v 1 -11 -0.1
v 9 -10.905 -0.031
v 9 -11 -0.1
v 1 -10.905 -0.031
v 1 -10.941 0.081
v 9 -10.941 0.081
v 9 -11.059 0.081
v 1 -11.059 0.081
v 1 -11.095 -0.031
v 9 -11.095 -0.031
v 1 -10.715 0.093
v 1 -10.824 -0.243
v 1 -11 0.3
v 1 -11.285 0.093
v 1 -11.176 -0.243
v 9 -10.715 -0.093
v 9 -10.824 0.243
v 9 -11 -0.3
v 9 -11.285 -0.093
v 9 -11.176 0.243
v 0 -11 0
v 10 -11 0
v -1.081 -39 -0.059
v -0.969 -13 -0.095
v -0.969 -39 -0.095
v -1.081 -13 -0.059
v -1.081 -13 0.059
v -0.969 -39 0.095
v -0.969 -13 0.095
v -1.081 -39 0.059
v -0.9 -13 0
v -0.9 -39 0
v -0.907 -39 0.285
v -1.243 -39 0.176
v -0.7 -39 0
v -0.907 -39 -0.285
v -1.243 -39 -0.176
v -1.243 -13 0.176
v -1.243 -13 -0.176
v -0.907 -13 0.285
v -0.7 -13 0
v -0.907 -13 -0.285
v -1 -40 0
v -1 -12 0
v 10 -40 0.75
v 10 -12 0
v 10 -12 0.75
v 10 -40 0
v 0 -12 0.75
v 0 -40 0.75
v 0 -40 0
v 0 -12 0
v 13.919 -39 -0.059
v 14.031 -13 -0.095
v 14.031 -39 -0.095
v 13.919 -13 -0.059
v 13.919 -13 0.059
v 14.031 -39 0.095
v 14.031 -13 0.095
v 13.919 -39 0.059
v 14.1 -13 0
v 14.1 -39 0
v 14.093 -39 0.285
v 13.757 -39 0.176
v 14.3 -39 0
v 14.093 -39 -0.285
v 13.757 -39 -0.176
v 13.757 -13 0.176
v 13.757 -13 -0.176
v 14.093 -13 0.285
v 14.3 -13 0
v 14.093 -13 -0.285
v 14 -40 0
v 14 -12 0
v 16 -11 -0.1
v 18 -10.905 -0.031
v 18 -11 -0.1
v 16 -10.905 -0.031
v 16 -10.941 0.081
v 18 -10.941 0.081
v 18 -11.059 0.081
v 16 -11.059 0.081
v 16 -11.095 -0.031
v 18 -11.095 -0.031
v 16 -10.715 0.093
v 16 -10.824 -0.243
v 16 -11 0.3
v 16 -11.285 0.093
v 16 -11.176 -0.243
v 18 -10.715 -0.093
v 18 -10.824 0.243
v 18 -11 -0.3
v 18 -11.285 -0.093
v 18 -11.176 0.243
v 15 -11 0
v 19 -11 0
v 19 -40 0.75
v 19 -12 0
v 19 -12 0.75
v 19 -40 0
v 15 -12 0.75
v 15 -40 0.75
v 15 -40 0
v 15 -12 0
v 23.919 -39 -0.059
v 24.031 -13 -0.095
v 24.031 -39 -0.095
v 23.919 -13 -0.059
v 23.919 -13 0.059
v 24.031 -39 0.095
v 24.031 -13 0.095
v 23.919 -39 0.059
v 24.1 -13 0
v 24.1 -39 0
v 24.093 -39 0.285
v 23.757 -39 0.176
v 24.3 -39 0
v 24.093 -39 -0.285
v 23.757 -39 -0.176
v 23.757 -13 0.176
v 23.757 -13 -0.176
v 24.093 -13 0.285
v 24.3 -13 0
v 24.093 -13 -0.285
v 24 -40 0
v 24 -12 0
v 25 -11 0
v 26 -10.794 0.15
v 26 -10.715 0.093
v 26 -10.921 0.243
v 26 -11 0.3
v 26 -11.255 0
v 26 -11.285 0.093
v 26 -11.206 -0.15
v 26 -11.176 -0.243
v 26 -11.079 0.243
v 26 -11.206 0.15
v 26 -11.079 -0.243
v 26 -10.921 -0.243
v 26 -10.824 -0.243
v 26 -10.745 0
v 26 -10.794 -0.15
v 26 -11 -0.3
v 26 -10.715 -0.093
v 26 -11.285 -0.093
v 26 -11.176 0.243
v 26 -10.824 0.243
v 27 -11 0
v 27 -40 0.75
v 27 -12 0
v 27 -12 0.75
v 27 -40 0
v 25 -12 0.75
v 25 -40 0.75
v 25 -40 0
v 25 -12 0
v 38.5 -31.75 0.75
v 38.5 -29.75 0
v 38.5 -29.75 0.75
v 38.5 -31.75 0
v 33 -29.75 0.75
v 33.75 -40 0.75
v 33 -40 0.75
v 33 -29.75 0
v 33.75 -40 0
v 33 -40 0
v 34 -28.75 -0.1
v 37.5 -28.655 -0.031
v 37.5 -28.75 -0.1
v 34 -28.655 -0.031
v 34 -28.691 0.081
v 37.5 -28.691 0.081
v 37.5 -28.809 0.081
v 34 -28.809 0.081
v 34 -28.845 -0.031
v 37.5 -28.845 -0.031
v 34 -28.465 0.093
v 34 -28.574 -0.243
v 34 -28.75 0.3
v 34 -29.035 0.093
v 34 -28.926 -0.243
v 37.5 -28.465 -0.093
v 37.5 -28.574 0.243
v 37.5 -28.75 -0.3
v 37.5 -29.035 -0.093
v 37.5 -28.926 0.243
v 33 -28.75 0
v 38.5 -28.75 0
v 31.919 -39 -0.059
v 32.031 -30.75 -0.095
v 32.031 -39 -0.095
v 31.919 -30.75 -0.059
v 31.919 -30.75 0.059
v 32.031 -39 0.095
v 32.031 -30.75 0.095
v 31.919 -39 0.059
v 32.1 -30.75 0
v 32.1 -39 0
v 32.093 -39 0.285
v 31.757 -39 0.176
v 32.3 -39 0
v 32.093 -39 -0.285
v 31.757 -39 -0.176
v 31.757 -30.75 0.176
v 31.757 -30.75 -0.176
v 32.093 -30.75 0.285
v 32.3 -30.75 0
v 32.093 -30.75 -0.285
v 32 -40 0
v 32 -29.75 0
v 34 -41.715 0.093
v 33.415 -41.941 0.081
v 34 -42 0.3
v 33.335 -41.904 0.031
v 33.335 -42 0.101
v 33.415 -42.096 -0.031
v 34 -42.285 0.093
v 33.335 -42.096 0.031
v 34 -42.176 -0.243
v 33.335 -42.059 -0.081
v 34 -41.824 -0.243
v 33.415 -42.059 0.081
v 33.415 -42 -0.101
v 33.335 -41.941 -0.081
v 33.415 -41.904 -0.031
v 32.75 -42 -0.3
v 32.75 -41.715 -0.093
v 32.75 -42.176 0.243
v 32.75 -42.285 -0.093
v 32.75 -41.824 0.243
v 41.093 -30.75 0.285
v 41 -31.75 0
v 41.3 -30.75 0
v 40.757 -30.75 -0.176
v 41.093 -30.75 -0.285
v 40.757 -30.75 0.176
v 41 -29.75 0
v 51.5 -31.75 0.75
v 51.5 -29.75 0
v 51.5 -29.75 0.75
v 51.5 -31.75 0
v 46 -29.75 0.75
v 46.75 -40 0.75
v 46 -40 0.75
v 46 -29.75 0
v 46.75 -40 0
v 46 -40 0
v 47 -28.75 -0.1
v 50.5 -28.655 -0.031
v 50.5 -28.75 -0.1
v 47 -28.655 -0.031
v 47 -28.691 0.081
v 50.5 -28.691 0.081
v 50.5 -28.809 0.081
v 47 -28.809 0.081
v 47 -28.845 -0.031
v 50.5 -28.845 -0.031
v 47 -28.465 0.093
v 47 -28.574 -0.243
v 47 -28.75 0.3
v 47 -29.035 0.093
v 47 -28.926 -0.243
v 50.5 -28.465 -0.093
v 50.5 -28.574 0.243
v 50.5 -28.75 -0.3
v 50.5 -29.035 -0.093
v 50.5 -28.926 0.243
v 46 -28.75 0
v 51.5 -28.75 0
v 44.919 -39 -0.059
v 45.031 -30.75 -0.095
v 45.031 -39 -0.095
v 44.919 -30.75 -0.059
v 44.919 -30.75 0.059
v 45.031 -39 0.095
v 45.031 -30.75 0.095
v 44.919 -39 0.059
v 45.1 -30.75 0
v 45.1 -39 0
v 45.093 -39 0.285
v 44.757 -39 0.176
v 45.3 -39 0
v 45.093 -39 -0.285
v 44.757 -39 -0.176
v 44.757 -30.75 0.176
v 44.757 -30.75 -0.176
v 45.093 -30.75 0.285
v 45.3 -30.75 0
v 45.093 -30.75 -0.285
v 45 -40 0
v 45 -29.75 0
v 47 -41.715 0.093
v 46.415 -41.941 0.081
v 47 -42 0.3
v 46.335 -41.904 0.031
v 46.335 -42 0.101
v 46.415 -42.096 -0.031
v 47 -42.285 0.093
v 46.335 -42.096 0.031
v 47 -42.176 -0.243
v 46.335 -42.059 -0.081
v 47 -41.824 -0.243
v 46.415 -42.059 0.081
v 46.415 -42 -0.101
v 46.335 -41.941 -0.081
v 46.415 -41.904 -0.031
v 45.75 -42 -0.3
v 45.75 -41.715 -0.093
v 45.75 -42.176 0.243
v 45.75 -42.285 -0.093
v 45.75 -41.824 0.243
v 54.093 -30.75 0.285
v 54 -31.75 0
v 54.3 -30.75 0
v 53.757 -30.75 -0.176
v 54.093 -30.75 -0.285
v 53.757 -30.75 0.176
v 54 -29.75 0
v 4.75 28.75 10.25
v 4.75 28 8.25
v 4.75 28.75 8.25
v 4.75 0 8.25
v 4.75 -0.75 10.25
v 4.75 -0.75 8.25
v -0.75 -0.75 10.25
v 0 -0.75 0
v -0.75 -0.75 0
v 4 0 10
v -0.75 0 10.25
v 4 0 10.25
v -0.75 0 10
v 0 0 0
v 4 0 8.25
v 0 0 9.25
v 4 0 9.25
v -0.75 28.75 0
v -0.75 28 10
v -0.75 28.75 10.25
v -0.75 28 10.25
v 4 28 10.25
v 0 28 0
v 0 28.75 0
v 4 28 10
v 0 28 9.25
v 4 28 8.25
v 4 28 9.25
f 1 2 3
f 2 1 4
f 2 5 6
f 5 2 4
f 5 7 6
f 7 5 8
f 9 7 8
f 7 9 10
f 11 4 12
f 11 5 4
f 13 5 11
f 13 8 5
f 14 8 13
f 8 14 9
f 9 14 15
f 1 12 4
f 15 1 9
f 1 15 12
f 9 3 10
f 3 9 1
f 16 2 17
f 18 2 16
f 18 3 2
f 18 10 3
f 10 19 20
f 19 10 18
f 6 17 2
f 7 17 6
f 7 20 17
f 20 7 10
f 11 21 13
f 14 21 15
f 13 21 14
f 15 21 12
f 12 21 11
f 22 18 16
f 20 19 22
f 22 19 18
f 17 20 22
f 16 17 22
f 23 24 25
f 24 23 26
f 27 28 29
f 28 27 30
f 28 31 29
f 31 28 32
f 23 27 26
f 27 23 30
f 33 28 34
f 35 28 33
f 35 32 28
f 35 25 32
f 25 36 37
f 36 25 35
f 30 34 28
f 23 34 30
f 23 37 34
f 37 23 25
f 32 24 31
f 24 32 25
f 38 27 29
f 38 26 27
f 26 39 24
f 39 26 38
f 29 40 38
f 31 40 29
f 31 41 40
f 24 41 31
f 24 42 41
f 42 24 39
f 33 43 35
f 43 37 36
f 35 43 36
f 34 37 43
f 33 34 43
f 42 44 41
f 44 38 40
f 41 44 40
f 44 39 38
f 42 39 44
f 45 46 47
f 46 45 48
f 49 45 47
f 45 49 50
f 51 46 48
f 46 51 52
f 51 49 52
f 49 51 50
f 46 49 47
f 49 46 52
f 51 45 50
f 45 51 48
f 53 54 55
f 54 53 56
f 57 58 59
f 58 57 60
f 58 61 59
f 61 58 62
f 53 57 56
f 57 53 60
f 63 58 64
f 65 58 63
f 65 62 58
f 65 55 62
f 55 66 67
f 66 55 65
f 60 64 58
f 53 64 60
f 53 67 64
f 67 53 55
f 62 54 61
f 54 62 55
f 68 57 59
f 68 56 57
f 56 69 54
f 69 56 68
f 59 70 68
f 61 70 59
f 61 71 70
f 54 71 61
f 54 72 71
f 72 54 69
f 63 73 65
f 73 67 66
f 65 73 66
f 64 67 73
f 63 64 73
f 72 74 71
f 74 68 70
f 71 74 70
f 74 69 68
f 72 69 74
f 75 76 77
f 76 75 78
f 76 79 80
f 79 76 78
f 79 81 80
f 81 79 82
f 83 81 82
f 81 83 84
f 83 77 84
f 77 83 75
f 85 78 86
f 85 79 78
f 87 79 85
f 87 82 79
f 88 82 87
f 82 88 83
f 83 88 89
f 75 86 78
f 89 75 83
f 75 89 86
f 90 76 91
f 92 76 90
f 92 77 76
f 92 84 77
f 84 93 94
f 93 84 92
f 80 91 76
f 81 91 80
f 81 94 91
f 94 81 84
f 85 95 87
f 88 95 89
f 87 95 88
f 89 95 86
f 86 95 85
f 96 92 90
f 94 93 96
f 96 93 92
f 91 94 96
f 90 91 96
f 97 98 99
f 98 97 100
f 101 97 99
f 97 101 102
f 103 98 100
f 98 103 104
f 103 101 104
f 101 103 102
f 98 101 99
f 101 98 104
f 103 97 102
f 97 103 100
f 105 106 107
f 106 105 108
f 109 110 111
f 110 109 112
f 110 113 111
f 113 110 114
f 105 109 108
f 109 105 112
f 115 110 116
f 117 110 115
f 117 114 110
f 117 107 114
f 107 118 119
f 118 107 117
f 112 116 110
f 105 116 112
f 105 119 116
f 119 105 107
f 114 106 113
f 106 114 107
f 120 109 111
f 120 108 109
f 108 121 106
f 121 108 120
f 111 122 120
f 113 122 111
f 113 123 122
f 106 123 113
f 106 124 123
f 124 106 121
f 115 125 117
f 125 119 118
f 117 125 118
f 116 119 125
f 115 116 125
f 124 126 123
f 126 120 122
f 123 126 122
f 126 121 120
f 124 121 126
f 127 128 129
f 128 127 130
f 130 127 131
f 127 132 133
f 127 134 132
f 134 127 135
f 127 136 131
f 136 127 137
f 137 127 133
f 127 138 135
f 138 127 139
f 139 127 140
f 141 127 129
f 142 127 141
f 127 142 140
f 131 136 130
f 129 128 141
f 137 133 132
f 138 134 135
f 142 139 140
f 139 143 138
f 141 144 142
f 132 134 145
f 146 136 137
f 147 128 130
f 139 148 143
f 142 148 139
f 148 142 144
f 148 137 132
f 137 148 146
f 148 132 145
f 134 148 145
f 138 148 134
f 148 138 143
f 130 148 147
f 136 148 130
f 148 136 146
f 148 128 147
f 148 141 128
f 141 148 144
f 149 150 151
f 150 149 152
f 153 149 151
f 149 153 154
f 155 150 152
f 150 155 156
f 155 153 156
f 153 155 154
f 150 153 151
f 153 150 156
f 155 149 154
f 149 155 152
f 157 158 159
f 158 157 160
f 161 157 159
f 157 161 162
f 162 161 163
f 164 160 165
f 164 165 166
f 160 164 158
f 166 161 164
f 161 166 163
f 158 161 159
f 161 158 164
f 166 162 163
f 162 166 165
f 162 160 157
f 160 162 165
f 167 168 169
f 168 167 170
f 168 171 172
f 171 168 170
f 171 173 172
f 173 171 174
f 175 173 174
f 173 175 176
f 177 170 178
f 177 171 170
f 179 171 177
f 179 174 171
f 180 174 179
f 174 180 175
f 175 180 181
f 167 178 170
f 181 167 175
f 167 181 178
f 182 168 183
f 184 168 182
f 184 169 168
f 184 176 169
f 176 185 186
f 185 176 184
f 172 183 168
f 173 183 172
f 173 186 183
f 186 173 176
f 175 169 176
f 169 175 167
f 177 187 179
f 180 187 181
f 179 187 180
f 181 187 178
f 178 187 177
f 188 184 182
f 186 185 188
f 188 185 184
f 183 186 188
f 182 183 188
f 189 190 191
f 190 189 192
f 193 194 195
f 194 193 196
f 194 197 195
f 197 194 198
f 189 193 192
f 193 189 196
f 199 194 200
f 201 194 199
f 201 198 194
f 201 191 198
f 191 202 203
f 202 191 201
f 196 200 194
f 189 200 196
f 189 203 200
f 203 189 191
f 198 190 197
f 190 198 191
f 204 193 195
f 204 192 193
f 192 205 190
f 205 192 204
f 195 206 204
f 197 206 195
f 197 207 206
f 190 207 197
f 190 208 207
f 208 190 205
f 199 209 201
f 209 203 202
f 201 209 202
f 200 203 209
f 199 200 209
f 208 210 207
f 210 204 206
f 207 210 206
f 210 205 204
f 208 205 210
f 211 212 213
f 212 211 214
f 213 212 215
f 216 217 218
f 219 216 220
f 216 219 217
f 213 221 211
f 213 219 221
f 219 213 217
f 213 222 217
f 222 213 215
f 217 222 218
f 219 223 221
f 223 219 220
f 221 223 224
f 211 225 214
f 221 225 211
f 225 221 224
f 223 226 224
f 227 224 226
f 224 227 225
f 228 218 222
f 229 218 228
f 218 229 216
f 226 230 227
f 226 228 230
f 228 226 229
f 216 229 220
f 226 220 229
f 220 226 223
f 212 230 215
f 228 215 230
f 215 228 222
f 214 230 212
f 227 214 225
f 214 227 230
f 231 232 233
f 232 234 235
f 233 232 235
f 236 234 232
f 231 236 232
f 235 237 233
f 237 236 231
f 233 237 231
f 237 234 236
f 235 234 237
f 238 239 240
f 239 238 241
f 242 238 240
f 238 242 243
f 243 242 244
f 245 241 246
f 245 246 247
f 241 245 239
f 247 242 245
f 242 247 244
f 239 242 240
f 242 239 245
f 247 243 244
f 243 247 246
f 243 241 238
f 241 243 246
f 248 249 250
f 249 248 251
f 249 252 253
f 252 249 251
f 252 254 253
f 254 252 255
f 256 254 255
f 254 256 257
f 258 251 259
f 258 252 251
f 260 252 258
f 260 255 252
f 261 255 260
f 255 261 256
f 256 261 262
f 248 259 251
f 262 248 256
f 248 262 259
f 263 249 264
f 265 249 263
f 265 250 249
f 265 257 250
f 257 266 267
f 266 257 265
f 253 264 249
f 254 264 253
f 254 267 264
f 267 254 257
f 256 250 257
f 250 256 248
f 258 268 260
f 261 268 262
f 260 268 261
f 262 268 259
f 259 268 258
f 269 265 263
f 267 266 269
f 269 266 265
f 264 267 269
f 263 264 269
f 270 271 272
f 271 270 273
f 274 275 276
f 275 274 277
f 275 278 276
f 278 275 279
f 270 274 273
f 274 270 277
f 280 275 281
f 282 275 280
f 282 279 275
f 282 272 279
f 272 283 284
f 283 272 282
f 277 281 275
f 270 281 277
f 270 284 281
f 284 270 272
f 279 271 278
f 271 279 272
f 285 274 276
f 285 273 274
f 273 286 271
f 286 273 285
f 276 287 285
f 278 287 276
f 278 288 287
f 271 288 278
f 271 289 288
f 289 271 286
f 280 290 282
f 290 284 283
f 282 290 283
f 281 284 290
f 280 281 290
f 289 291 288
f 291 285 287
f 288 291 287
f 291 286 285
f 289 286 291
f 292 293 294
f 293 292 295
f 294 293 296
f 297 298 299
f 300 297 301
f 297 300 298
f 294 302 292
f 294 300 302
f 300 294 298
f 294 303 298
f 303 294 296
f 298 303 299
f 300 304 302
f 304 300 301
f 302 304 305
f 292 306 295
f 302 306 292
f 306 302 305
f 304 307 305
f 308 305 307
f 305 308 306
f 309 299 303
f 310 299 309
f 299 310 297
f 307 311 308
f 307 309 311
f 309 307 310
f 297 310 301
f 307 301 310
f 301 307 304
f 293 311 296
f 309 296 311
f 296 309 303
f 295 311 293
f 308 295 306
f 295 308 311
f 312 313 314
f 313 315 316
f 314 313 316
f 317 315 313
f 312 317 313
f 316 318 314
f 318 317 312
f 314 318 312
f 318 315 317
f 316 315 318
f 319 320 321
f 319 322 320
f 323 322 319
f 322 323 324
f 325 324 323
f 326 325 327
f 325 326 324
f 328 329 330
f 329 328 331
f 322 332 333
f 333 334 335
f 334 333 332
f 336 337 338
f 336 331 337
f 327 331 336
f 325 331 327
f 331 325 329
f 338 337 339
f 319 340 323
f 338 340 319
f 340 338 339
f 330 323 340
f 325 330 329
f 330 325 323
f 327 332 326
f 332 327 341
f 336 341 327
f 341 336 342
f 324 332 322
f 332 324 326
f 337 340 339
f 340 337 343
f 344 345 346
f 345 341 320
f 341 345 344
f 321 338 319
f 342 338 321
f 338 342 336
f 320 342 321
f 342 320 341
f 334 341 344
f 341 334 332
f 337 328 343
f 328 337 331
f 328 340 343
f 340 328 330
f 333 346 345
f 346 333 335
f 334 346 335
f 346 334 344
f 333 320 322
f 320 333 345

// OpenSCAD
// file: ../lib/common.scad
//--------------------------------------------------------------------------------------------------
// Module Prism
//--------------------------------------------------------------------------------------------------
module prism(z, y, x)
{
    rotate([0, 90, 0])
    {
        polyhedron(
                points=[[0,0,0], [x,0,0], [x,y,0], [0,y,0], [0,y,z], [x,y,z]],
                faces=[[0,1,2,3],[5,4,3,2],[0,4,5,1],[0,3,4],[5,2,1]]);
    }
    
}

//--------------------------------------------------------------------------------------------------
// Module Side panel
//--------------------------------------------------------------------------------------------------
module rect_cut(x, y, z, dx, dy)
{
    // Top panel
    translate([0, dy, 0])
    {
        cube([x, y - dy, z]);
    };

    // Left bottom panel
    translate([0, 0, 0])
    {
        cube([dx, dy, z]);
    };

    // Triangle
    translate([dx, 0, 0])
    {
        rotate([0, 0, 0])
        {
            prism(x - dx, dy, -z);
        }
    };
}

//--------------------------------------------------------------------------------------------------
// X dimensional arrow
//--------------------------------------------------------------------------------------------------
module arrow_x(l)
{
    line_w = 0.1;
    arrow_w = 1;
    arrow_h = 0.3;

    // Line
    translate([l / 2, 0, 0])
    {
        rotate([0, 90, 0])
        {
            color([0.4, 0.4, 0.4])
            cylinder(l - arrow_w * 2, line_w, line_w, true);
        }
    }

    // Left arrow
    translate([arrow_w, 0, 0])
    {
        rotate([0, 270, 0])
        {
            color([0.4, 0.4, 0.4])
            cylinder(arrow_w, arrow_h, 0, false);
        }
    }

    // Right arrow
    translate([l - arrow_w, 0, 0])
    {
        rotate([0, 90, 0])
        {
            color([0.4, 0.4, 0.4])
            cylinder(arrow_w, arrow_h, 0, false);
        }
    }

    // Text
    translate([l/3, 0.5, 0])
    {
        color([0.4, 0.4, 0.4])
        text(str(l), size=1);
    }
}

//--------------------------------------------------------------------------------------------------
// Y dimensional arrow
//--------------------------------------------------------------------------------------------------
module arrow_y(l)
{
    line_w = 0.1;
    arrow_w = 1;
    arrow_h = 0.3;

    // Line
    translate([0, l / 2, 0])
    {
        rotate([90, 0, 00])
        {
            color([0.4, 0.4, 0.4])
            cylinder(l - arrow_w * 2, line_w, line_w, true);
        }
    }

    // Left arrow
    translate([0 ,arrow_w, 0])
    {
        rotate([90, 0, 0])
        {
            color([0.4, 0.4, 0.4])
            cylinder(arrow_w, arrow_h, 0, false);
        }
    }

    // Right arrow
    translate([0, l - arrow_w, 0])
    {
        rotate([270, 0, 0])
        {
            color([0.4, 0.4, 0.4])
            cylinder(arrow_w, arrow_h, 0, false);
        }
    }

    // Text
    translate([-0.5, l/3, 0])
    {
        rotate([0 ,0, 90])
        {
            color([0.4, 0.4, 0.4])
            text(str(l), size=1);
        }
    }
}
// main file
include <../lib/common.scad>

//--------------------------------------------------------------------------------------------------
module back_panel()
{
    color([1, 0, 0])
    cube([10, 28, 0.75]);
}

//--------------------------------------------------------------------------------------------------
module top_board()
{
    color([0,1,1])
    cube([4, 28, 0.75]);
}

//--------------------------------------------------------------------------------------------------
module front_panel()
{
    color([0,0,1])
    cube([2, 28, 0.75]);
}

//--------------------------------------------------------------------------------------------------
module side_panel()
{
    color([0, 1, 0])
    rect_cut(5.5, 10.25, 0.75, 0.75, 8.25);
}

//--------------------------------------------------------------------------------------------------
// Draw Parts
//--------------------------------------------------------------------------------------------------
translate([0, -40, 0])
{
    //----------------------------------------------------------------------------------------------
    // Back panel
    //----------------------------------------------------------------------------------------------
    translate([0, 0, 0])
    {
        back_panel();

        translate([0, 29, 0])
        {
            arrow_x(10);
        };

        translate([-1, 0, 0])
        {
            arrow_y(28);
        };
    };

    //----------------------------------------------------------------------------------------------
    // Top board
    //----------------------------------------------------------------------------------------------
    translate([15, 0, 0])
    {
        top_board();

        translate([0, 29, 0])
        {
            arrow_x(4);
        };

        translate([-1, 0, 0])
        {
            arrow_y(28);
        }
    };

    //----------------------------------------------------------------------------------------------
    // Front panel
    //----------------------------------------------------------------------------------------------
    translate([25, 0, 0])
    {
        front_panel();

        translate([0, 29, 0])
        {
            arrow_x(2);
        };

        translate([-1, 0, 0])
        {
            arrow_y(28);
        }
    };

    //----------------------------------------------------------------------------------------------
    // Left panel
    //----------------------------------------------------------------------------------------------
    translate([33, 0, 0])
    {
        side_panel();

        translate([0, 11.25, 0])
        {
            arrow_x(5.5);
        };

        translate([-1, 0, 0])
        {
            arrow_y(10.25);
        };

        translate([0, -2, 0])
        {
            arrow_x(0.75);
        };

        translate([8, 8.25, 0])
        {
            arrow_y(2);
        };
    };

    //----------------------------------------------------------------------------------------------
    // Right panel
    //----------------------------------------------------------------------------------------------
    translate([46, 0, 0])
    {
        side_panel();

        translate([0, 11.25, 0])
        {
            arrow_x(5.5);
        };

        translate([-1, 0, 0])
        {
            arrow_y(10.25);
        }

        translate([0, -2, 0])
        {
            arrow_x(0.75);
        };

        translate([8, 8.25, 0])
        {
            arrow_y(2);
        };
    };
}


//--------------------------------------------------------------------------------------------------
// Render
//--------------------------------------------------------------------------------------------------
translate([0, 0, 0])
{
    //----------------------------------------------------------------------------------------------
    // Back panel
    //----------------------------------------------------------------------------------------------
    translate([-0.75, 0, 10])
    {
        rotate([0, 90, 0])
        {
            back_panel();
        }
    };

    //----------------------------------------------------------------------------------------------
    // Top board
    //----------------------------------------------------------------------------------------------
    translate([0, 0, 9.25])
    {
        top_board();
    };

    //----------------------------------------------------------------------------------------------
    // Front panel
    //----------------------------------------------------------------------------------------------
    translate([4, 0, 10.25])
    {
        rotate([0, 90, 0])
        {
            front_panel();
        }
    };

    //----------------------------------------------------------------------------------------------
    // Left panel
    //----------------------------------------------------------------------------------------------
    translate([-0.75, 0, 0])
    {
        rotate([90, 0, 0])
        {
            side_panel();
        }
    };

    //----------------------------------------------------------------------------------------------
    // Right panel
    //----------------------------------------------------------------------------------------------
    translate([-0.75, 28.75, 0])
    {
        rotate([90, 0, 0])
        {
            side_panel();
        }
    };
}
